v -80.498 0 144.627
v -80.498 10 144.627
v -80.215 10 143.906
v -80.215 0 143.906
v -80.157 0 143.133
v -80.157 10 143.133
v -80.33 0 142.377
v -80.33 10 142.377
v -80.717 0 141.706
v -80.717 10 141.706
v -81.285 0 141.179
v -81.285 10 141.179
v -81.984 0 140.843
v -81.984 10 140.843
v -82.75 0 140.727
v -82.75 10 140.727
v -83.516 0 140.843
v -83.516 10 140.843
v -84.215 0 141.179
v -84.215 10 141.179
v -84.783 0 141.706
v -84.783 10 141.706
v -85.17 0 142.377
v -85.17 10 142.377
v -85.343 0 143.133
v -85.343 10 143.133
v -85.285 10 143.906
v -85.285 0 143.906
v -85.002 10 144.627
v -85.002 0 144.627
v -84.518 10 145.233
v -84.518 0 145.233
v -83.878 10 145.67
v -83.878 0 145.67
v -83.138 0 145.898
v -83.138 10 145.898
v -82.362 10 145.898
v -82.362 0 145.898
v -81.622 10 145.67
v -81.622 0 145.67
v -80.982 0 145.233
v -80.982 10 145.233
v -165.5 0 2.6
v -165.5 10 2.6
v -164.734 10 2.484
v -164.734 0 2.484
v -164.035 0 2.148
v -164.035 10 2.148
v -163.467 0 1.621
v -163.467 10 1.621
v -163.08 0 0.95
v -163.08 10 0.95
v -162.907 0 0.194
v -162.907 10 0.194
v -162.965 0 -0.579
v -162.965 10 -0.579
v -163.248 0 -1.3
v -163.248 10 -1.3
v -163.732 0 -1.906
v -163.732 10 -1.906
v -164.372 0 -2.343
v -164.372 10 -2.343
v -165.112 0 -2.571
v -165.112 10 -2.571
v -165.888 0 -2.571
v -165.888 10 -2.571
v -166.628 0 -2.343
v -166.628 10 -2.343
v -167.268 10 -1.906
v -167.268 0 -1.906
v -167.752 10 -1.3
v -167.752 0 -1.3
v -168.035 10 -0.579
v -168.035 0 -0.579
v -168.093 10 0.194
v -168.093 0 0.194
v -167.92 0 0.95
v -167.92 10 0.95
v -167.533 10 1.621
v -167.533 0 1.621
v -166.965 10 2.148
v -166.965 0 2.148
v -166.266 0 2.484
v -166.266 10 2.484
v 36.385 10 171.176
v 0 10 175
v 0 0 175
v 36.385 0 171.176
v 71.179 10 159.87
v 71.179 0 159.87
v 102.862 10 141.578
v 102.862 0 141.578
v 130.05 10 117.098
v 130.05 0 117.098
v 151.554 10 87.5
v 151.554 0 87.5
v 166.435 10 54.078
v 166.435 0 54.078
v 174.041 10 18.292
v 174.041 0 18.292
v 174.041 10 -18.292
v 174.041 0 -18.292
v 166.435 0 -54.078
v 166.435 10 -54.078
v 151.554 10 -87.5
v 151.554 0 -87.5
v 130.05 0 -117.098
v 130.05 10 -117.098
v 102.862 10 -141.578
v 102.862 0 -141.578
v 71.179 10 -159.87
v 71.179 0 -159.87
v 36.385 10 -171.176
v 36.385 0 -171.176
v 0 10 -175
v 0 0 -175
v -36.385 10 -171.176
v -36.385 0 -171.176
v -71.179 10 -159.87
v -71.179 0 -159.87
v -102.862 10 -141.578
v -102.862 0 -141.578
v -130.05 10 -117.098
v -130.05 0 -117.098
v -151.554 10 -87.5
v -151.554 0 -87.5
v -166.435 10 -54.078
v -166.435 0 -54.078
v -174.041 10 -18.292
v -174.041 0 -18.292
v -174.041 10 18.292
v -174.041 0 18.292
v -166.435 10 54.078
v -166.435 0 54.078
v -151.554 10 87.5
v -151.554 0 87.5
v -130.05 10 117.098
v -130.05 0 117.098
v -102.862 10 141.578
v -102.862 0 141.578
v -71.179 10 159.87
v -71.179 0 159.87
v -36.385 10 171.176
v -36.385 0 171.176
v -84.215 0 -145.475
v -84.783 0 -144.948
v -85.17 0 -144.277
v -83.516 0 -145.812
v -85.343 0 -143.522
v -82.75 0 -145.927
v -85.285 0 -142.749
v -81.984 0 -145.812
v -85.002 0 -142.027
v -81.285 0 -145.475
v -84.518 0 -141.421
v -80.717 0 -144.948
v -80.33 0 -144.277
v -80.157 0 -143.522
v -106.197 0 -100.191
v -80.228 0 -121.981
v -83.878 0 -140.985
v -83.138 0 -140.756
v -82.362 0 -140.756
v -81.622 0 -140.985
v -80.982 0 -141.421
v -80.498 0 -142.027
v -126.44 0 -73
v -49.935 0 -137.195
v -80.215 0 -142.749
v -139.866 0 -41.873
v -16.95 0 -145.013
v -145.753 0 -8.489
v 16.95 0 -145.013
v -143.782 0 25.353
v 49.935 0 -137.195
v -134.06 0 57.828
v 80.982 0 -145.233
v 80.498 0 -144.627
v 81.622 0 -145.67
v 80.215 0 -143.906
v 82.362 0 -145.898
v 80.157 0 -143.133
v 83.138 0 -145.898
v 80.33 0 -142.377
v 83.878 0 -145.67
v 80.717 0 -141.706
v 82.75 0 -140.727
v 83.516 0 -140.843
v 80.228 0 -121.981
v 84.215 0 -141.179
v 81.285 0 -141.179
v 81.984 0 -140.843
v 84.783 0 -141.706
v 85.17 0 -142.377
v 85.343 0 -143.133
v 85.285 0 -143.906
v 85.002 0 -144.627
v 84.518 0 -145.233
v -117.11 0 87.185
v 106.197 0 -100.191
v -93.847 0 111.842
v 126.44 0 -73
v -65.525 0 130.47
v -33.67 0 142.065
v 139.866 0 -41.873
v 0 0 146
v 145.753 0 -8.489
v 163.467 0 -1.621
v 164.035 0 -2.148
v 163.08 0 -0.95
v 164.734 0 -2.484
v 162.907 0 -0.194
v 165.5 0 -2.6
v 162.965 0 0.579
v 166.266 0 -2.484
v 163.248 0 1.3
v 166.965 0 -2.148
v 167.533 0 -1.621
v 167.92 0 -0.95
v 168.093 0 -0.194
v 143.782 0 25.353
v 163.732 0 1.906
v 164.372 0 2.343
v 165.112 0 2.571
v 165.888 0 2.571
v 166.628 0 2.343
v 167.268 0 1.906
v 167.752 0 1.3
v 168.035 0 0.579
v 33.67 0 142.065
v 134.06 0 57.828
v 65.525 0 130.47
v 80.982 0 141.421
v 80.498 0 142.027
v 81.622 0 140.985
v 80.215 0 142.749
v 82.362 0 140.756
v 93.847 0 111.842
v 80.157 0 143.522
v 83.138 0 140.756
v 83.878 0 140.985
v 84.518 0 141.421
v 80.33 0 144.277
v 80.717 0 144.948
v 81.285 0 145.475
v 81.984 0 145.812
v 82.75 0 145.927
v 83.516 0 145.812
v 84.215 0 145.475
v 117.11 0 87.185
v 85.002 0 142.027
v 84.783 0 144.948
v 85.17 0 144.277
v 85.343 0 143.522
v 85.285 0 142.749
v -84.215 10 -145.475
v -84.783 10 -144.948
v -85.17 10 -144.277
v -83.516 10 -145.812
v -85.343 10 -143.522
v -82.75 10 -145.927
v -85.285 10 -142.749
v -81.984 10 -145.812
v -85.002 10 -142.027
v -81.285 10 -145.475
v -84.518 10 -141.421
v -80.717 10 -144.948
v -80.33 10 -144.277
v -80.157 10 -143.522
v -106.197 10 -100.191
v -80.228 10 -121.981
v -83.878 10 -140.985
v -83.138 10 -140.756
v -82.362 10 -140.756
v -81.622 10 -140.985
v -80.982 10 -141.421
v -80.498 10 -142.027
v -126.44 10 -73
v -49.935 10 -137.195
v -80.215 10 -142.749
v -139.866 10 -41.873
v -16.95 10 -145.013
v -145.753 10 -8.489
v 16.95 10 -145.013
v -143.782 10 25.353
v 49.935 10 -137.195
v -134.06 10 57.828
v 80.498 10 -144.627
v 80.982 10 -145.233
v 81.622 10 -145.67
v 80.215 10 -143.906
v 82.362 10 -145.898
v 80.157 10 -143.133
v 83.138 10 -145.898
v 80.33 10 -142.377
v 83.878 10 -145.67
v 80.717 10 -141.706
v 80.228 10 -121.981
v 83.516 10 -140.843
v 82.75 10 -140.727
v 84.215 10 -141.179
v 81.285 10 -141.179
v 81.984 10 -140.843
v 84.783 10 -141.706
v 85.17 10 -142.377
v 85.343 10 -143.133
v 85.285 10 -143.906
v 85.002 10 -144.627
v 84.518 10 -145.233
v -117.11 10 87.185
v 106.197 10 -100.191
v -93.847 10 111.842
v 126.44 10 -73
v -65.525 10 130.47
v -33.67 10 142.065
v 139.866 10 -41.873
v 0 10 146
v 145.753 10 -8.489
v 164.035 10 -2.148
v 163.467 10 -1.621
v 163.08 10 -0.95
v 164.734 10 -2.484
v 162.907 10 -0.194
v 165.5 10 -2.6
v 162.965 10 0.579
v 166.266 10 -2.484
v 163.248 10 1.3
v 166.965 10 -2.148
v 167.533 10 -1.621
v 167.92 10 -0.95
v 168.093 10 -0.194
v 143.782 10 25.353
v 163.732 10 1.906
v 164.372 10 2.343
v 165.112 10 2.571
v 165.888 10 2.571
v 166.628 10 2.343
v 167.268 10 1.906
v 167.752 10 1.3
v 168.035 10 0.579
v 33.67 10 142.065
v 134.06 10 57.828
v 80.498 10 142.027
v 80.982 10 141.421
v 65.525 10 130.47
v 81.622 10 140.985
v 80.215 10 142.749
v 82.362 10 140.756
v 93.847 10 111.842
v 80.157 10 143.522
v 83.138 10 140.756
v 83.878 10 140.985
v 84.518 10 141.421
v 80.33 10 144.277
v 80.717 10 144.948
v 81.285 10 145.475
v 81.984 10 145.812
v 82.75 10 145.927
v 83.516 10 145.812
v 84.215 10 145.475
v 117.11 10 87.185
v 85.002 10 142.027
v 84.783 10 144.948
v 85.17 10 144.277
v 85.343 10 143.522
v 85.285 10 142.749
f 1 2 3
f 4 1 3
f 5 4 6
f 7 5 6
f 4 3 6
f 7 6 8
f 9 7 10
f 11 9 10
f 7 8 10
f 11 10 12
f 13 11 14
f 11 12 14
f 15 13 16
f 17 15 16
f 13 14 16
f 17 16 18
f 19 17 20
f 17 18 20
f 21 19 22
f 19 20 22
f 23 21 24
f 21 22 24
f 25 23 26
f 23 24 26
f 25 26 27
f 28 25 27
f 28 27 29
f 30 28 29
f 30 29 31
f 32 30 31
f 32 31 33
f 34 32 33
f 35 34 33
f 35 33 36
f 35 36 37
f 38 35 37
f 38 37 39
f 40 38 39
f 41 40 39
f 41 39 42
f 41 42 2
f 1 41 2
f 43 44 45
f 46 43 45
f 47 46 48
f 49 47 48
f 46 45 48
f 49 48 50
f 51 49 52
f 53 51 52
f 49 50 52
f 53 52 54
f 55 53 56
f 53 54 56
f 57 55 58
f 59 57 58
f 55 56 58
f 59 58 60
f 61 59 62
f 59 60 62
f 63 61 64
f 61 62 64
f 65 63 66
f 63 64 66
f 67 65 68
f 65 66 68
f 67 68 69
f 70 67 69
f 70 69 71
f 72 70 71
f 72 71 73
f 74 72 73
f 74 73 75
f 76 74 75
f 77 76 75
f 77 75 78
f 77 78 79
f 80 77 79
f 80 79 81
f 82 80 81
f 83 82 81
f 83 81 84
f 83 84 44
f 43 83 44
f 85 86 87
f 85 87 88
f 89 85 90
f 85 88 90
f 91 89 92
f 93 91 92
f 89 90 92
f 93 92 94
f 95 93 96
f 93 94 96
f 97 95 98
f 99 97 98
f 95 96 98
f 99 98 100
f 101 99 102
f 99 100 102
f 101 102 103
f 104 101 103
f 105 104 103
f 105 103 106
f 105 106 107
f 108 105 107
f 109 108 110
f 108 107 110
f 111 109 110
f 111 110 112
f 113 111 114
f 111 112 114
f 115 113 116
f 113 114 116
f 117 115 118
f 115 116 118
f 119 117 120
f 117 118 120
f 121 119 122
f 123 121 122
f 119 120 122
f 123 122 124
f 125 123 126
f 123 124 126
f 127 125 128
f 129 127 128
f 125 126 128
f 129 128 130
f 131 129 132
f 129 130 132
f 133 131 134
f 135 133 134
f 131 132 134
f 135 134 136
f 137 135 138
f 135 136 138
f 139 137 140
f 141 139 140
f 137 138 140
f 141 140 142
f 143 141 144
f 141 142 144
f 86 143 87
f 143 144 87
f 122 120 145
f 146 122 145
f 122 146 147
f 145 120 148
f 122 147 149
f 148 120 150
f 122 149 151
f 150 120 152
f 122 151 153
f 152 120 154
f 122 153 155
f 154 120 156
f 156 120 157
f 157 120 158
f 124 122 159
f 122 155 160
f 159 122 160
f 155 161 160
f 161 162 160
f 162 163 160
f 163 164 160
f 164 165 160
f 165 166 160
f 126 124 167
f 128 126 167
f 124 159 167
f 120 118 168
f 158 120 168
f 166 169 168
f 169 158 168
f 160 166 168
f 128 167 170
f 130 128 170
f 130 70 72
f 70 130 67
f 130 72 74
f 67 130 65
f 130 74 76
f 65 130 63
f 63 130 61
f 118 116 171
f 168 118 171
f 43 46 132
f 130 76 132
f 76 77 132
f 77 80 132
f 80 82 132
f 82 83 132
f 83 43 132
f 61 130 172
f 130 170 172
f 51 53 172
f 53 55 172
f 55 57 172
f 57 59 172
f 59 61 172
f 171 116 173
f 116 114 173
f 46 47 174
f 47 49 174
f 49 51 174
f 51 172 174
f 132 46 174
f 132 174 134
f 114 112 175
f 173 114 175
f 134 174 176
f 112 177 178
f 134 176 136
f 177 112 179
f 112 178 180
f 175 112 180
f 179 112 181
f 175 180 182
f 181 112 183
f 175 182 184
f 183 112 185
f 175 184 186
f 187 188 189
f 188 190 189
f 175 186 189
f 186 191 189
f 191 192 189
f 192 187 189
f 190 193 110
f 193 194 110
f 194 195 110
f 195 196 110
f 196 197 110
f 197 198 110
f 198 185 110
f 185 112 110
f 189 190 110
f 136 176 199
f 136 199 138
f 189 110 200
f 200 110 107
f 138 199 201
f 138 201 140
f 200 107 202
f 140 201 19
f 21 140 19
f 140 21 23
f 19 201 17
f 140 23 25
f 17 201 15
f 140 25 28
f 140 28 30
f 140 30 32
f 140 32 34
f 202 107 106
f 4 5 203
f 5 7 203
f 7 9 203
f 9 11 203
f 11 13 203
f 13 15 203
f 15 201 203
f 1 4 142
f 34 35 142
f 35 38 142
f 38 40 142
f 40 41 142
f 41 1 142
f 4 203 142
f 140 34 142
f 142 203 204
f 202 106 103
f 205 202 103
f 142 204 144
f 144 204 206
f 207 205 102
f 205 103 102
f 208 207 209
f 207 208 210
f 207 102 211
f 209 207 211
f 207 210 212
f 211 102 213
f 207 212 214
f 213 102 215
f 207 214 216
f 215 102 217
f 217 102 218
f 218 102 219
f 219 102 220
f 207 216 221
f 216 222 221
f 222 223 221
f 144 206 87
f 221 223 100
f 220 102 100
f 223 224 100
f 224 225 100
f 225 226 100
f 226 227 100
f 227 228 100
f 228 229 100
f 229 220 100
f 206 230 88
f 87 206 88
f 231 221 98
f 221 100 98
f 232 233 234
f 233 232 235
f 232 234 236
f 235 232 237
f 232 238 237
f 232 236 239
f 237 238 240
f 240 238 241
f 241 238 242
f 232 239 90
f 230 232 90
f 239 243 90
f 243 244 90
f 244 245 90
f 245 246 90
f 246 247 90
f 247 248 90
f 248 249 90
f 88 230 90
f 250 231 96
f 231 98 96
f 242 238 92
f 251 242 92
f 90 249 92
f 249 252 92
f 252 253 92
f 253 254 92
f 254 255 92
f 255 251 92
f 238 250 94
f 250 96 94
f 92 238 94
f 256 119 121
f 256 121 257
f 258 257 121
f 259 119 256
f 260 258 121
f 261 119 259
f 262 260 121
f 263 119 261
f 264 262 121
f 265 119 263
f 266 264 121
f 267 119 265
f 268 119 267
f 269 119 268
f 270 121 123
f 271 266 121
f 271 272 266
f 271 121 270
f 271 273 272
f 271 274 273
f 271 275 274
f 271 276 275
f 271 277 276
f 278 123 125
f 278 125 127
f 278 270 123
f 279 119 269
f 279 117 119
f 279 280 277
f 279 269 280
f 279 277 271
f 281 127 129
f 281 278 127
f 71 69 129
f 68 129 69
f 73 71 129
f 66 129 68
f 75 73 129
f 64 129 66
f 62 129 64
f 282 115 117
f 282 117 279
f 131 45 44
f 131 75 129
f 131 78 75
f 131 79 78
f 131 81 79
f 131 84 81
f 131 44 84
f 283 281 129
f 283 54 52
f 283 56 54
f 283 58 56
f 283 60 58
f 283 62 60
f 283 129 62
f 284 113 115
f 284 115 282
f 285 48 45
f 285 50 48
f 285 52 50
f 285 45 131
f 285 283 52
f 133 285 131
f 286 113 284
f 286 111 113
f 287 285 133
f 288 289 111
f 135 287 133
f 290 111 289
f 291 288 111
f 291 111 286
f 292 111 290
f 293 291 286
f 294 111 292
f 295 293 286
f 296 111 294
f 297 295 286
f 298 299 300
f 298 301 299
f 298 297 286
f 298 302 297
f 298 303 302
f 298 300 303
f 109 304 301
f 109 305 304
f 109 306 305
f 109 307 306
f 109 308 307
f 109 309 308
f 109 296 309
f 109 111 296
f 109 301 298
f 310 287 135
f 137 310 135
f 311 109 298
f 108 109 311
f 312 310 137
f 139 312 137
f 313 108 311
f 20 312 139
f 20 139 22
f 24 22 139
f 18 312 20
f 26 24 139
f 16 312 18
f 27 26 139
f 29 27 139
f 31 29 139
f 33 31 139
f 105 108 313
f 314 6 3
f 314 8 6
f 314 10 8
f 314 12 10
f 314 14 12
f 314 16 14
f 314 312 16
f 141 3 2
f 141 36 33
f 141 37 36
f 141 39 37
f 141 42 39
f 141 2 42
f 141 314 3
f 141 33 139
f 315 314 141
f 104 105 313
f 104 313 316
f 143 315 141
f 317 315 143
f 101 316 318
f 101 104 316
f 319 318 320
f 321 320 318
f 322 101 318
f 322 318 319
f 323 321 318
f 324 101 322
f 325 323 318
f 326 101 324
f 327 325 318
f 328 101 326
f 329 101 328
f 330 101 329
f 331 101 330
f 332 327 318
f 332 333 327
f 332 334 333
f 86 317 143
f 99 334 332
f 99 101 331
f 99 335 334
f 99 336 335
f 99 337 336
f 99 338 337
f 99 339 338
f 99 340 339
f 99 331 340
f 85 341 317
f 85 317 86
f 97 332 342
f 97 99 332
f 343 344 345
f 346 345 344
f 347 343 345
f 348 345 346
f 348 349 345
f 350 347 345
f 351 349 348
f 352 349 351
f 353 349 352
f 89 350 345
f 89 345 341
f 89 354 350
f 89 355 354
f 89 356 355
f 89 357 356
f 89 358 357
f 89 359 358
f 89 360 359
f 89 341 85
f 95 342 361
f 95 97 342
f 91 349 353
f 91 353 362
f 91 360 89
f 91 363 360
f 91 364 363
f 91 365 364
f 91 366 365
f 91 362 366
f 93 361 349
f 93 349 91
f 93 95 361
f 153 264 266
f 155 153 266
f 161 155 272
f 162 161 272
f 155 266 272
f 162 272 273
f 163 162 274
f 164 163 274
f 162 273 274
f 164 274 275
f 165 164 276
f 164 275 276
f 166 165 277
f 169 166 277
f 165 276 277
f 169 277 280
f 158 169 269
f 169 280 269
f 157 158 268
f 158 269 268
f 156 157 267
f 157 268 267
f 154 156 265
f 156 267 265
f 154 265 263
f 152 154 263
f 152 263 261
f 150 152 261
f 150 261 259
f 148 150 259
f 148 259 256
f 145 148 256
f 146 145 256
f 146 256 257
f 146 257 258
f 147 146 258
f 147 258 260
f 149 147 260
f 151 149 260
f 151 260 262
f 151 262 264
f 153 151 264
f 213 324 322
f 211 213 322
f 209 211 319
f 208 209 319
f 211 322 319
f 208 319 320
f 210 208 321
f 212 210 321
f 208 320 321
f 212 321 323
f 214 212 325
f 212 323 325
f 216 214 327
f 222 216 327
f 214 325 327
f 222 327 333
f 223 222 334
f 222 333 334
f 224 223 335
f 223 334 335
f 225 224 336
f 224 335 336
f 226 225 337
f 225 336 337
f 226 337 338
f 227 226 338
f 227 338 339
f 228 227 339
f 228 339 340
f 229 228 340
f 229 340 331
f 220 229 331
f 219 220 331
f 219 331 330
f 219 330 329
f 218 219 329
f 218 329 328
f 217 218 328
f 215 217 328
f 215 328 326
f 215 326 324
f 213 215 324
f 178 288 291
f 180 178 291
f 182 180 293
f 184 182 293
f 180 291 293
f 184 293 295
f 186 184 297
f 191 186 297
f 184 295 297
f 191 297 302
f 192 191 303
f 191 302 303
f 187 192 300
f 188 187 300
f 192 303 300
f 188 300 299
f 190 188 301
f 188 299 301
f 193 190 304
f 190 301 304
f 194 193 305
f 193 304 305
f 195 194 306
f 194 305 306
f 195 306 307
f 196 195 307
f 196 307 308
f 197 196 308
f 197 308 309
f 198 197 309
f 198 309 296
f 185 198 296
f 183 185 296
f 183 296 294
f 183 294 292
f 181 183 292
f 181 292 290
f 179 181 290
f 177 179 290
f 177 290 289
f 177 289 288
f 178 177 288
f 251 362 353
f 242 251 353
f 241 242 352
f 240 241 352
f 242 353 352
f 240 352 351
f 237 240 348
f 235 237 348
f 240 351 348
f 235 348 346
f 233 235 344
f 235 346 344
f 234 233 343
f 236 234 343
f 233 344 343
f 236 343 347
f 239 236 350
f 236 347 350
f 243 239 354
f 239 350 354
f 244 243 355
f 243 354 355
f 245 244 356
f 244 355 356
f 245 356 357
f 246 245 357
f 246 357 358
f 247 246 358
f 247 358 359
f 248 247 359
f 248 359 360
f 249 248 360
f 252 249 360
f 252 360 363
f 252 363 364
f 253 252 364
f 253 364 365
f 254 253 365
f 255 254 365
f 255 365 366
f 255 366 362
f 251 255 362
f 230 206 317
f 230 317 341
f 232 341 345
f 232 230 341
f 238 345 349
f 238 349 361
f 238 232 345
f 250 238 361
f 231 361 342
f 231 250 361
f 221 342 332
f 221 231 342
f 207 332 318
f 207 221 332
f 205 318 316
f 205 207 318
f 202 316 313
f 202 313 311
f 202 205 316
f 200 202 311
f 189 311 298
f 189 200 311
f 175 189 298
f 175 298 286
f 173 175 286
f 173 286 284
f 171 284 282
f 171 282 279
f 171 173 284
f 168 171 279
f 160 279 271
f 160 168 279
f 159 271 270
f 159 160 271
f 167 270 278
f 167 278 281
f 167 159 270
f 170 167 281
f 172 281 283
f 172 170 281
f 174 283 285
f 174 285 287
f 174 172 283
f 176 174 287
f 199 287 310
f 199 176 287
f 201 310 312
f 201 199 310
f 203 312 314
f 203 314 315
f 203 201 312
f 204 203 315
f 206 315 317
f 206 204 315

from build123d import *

# Parameters (mm, degrees)
SKETCH_1_R               = 175
SKETCH_1_R_2             = 146
EXTRUDE_1_DEPTH          = 10
SKETCH_2_R               = 2.6
CUT_EXTRUDE_1_DEPTH      = 248.68932153
PATTERN_CIRCULAR_1_COUNT = 6


with BuildPart() as part:
    # Эскиз1 → Бобышка-Вытянуть1 (new body)
    with BuildSketch(Plane(origin=(0, 0, 0), x_dir=(1, 0, 0), z_dir=(0, 1, 0))):
        with Locations(Location((0, 0, 0), (0, 0, 270))):
            Circle(SKETCH_1_R)
        with Locations(Location((0, 0, 0), (0, 0, 270))):
            Circle(SKETCH_1_R_2, mode=Mode.SUBTRACT)
    extrude(amount=EXTRUDE_1_DEPTH)

    # Эскиз2 → Вырез-Вытянуть1 (cut, through all)
    with BuildSketch(Plane(origin=(0, 10, 0), x_dir=(1, 0, 0), z_dir=(0, 1, 0))):
        with Locations(Location((-165.5, 0, 0), (0, 0, 270))):
            Circle(SKETCH_2_R)
    cut_extrude_1 = extrude(amount=-CUT_EXTRUDE_1_DEPTH, mode=Mode.SUBTRACT)

    # Круговой массив1: Вырез-Вытянуть1 ×6 about axis
    pattern_circular_1_axis = Axis((0, 0, 0), (0, 1, 0))
    for i in range(1, PATTERN_CIRCULAR_1_COUNT):
        add(cut_extrude_1.rotate(pattern_circular_1_axis, i * 360 / PATTERN_CIRCULAR_1_COUNT), mode=Mode.SUBTRACT)


solid = part.part
